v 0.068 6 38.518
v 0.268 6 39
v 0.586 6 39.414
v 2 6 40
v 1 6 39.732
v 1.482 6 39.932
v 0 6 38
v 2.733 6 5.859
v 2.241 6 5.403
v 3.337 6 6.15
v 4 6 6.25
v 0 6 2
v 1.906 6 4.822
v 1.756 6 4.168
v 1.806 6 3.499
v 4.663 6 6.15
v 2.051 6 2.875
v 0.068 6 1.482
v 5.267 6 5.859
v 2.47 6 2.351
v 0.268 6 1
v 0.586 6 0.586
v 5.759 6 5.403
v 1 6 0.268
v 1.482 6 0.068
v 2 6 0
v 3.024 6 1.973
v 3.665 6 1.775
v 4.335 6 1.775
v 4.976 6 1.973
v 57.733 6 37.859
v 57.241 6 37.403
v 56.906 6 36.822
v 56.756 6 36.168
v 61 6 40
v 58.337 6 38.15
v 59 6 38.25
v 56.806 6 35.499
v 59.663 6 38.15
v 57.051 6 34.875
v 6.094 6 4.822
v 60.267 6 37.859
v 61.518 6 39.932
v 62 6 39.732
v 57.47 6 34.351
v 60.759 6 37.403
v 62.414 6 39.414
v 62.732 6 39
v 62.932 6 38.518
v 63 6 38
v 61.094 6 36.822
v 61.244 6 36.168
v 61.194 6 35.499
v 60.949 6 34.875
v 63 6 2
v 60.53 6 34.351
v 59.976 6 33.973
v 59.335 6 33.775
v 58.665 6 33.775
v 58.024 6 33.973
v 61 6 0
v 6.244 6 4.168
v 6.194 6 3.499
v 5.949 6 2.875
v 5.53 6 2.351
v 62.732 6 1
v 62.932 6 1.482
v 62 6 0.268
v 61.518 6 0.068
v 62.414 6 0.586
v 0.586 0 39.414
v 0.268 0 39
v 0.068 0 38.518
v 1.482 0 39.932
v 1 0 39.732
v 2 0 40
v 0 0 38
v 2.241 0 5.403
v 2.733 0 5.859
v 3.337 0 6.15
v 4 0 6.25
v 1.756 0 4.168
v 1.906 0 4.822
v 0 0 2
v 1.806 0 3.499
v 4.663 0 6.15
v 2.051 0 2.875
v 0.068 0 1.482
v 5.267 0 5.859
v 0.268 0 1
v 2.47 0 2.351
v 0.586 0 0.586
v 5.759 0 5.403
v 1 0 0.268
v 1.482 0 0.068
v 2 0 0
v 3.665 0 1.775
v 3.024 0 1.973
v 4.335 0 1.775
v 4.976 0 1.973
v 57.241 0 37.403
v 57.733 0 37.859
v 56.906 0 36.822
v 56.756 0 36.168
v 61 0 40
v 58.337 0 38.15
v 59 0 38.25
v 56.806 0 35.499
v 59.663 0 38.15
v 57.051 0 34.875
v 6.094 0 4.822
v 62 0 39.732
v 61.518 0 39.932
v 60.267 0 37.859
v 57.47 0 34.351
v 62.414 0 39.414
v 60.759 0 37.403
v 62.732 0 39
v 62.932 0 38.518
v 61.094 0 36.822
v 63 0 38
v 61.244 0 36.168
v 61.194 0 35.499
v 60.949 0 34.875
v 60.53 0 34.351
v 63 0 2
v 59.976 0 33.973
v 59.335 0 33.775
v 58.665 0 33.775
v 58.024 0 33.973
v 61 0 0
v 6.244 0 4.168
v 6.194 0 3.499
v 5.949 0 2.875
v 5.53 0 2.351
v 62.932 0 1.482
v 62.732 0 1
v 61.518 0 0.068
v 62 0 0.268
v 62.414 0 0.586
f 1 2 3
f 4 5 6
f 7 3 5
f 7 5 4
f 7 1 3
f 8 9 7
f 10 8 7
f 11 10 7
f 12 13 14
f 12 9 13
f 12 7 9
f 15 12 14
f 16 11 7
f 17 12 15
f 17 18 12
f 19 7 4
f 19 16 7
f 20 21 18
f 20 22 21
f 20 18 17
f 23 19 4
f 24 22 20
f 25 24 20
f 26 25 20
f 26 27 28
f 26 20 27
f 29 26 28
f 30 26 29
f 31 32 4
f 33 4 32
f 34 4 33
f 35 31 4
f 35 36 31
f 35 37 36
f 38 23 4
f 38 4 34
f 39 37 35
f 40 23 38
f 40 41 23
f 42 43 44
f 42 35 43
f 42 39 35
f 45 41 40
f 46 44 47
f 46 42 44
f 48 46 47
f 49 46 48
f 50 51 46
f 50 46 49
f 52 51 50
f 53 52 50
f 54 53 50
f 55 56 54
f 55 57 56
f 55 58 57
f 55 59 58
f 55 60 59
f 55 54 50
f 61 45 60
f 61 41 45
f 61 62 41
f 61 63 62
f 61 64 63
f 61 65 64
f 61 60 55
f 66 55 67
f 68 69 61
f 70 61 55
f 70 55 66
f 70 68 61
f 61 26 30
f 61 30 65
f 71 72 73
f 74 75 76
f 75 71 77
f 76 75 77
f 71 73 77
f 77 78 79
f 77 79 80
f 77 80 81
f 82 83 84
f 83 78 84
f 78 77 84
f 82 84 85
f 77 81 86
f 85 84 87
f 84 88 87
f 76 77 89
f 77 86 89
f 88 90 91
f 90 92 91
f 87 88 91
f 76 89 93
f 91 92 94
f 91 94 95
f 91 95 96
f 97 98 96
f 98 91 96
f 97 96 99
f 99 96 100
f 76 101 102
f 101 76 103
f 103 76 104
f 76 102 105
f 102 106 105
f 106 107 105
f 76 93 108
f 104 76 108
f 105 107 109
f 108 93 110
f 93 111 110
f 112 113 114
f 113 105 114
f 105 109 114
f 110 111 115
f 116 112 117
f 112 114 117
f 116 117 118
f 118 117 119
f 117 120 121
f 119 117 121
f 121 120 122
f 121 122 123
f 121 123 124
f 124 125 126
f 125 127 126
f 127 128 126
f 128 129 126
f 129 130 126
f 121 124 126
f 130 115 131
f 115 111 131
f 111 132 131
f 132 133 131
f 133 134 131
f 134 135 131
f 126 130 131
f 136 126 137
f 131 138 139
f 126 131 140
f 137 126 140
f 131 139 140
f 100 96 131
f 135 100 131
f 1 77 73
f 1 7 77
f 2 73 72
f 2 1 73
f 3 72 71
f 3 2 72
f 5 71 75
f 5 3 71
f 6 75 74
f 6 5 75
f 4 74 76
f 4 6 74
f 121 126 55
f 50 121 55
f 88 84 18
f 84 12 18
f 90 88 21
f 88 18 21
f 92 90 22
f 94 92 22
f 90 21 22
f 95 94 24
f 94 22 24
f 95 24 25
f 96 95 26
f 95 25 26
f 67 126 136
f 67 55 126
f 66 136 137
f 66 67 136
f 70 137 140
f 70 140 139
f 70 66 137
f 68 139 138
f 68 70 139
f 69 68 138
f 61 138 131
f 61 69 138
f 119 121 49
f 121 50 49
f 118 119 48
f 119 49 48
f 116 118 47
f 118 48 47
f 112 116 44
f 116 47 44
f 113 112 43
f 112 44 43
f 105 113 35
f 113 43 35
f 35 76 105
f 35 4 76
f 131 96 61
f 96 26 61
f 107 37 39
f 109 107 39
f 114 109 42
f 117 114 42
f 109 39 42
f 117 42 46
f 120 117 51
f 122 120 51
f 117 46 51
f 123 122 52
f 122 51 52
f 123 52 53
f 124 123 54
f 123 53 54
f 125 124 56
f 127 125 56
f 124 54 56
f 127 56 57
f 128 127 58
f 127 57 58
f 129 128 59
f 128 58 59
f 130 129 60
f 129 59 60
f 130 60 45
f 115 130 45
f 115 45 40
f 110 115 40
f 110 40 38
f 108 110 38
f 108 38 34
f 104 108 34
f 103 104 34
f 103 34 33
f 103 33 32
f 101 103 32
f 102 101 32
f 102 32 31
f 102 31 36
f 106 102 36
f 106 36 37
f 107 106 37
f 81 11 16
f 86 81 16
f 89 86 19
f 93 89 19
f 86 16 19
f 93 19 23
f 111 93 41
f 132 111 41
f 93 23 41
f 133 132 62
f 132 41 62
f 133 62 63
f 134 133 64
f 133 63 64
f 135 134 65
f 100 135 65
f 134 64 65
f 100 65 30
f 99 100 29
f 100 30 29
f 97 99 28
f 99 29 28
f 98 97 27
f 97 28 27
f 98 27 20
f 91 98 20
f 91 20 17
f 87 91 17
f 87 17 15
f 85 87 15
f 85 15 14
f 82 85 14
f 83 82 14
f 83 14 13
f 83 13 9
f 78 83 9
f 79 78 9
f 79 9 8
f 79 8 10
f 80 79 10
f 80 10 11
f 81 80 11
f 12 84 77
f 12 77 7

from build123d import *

# Parameters (mm, degrees)
SKETCH_1_W          = 63
SKETCH_1_H          = 6
BLOCKEXTRUDE_DEPTH  = 40
FILLET_2_R          = 2
SKETCH_2_R          = 2.25
MOUNTING_HOLE_DEPTH = 75.866547937
SKETCH_3_R          = 2.25
CUT_EXTRUDE_2_DEPTH = 75.866547937


with BuildPart() as part:
    # 草图1 → BlockExtrude (new body)
    with BuildSketch(Plane.XY):
        with Locations((31.5, 3)):
            Rectangle(SKETCH_1_W, SKETCH_1_H)
    extrude(amount=BLOCKEXTRUDE_DEPTH)

    # Fillet 2
    fillet_2_edges = [part.edges().sort_by_distance(p)[0] for p in [
        (63, 3, 40),
        (0, 3, 40),
        (63, 3, 0),
        (0, 3, 0),
    ]]
    fillet(fillet_2_edges, radius=FILLET_2_R)

    # 草图2 → Mounting_hole (cut, through all)
    with BuildSketch(Plane(origin=(0, 6, 0), x_dir=(1, 0, 0), z_dir=(0, 1, 0))):
        with Locations(Location((4, -4, 0), (0, 0, 270))):
            Circle(SKETCH_2_R)
    extrude(amount=-MOUNTING_HOLE_DEPTH, mode=Mode.SUBTRACT)

    # 草图3 → 切除-拉伸2 (cut, through all)
    with BuildSketch(Plane(origin=(0, 6, 0), x_dir=(1, 0, 0), z_dir=(0, 1, 0))):
        with Locations(Location((59, -36, 0), (0, 0, 270))):
            Circle(SKETCH_3_R)
    extrude(amount=-CUT_EXTRUDE_2_DEPTH, mode=Mode.SUBTRACT)


solid = part.part
